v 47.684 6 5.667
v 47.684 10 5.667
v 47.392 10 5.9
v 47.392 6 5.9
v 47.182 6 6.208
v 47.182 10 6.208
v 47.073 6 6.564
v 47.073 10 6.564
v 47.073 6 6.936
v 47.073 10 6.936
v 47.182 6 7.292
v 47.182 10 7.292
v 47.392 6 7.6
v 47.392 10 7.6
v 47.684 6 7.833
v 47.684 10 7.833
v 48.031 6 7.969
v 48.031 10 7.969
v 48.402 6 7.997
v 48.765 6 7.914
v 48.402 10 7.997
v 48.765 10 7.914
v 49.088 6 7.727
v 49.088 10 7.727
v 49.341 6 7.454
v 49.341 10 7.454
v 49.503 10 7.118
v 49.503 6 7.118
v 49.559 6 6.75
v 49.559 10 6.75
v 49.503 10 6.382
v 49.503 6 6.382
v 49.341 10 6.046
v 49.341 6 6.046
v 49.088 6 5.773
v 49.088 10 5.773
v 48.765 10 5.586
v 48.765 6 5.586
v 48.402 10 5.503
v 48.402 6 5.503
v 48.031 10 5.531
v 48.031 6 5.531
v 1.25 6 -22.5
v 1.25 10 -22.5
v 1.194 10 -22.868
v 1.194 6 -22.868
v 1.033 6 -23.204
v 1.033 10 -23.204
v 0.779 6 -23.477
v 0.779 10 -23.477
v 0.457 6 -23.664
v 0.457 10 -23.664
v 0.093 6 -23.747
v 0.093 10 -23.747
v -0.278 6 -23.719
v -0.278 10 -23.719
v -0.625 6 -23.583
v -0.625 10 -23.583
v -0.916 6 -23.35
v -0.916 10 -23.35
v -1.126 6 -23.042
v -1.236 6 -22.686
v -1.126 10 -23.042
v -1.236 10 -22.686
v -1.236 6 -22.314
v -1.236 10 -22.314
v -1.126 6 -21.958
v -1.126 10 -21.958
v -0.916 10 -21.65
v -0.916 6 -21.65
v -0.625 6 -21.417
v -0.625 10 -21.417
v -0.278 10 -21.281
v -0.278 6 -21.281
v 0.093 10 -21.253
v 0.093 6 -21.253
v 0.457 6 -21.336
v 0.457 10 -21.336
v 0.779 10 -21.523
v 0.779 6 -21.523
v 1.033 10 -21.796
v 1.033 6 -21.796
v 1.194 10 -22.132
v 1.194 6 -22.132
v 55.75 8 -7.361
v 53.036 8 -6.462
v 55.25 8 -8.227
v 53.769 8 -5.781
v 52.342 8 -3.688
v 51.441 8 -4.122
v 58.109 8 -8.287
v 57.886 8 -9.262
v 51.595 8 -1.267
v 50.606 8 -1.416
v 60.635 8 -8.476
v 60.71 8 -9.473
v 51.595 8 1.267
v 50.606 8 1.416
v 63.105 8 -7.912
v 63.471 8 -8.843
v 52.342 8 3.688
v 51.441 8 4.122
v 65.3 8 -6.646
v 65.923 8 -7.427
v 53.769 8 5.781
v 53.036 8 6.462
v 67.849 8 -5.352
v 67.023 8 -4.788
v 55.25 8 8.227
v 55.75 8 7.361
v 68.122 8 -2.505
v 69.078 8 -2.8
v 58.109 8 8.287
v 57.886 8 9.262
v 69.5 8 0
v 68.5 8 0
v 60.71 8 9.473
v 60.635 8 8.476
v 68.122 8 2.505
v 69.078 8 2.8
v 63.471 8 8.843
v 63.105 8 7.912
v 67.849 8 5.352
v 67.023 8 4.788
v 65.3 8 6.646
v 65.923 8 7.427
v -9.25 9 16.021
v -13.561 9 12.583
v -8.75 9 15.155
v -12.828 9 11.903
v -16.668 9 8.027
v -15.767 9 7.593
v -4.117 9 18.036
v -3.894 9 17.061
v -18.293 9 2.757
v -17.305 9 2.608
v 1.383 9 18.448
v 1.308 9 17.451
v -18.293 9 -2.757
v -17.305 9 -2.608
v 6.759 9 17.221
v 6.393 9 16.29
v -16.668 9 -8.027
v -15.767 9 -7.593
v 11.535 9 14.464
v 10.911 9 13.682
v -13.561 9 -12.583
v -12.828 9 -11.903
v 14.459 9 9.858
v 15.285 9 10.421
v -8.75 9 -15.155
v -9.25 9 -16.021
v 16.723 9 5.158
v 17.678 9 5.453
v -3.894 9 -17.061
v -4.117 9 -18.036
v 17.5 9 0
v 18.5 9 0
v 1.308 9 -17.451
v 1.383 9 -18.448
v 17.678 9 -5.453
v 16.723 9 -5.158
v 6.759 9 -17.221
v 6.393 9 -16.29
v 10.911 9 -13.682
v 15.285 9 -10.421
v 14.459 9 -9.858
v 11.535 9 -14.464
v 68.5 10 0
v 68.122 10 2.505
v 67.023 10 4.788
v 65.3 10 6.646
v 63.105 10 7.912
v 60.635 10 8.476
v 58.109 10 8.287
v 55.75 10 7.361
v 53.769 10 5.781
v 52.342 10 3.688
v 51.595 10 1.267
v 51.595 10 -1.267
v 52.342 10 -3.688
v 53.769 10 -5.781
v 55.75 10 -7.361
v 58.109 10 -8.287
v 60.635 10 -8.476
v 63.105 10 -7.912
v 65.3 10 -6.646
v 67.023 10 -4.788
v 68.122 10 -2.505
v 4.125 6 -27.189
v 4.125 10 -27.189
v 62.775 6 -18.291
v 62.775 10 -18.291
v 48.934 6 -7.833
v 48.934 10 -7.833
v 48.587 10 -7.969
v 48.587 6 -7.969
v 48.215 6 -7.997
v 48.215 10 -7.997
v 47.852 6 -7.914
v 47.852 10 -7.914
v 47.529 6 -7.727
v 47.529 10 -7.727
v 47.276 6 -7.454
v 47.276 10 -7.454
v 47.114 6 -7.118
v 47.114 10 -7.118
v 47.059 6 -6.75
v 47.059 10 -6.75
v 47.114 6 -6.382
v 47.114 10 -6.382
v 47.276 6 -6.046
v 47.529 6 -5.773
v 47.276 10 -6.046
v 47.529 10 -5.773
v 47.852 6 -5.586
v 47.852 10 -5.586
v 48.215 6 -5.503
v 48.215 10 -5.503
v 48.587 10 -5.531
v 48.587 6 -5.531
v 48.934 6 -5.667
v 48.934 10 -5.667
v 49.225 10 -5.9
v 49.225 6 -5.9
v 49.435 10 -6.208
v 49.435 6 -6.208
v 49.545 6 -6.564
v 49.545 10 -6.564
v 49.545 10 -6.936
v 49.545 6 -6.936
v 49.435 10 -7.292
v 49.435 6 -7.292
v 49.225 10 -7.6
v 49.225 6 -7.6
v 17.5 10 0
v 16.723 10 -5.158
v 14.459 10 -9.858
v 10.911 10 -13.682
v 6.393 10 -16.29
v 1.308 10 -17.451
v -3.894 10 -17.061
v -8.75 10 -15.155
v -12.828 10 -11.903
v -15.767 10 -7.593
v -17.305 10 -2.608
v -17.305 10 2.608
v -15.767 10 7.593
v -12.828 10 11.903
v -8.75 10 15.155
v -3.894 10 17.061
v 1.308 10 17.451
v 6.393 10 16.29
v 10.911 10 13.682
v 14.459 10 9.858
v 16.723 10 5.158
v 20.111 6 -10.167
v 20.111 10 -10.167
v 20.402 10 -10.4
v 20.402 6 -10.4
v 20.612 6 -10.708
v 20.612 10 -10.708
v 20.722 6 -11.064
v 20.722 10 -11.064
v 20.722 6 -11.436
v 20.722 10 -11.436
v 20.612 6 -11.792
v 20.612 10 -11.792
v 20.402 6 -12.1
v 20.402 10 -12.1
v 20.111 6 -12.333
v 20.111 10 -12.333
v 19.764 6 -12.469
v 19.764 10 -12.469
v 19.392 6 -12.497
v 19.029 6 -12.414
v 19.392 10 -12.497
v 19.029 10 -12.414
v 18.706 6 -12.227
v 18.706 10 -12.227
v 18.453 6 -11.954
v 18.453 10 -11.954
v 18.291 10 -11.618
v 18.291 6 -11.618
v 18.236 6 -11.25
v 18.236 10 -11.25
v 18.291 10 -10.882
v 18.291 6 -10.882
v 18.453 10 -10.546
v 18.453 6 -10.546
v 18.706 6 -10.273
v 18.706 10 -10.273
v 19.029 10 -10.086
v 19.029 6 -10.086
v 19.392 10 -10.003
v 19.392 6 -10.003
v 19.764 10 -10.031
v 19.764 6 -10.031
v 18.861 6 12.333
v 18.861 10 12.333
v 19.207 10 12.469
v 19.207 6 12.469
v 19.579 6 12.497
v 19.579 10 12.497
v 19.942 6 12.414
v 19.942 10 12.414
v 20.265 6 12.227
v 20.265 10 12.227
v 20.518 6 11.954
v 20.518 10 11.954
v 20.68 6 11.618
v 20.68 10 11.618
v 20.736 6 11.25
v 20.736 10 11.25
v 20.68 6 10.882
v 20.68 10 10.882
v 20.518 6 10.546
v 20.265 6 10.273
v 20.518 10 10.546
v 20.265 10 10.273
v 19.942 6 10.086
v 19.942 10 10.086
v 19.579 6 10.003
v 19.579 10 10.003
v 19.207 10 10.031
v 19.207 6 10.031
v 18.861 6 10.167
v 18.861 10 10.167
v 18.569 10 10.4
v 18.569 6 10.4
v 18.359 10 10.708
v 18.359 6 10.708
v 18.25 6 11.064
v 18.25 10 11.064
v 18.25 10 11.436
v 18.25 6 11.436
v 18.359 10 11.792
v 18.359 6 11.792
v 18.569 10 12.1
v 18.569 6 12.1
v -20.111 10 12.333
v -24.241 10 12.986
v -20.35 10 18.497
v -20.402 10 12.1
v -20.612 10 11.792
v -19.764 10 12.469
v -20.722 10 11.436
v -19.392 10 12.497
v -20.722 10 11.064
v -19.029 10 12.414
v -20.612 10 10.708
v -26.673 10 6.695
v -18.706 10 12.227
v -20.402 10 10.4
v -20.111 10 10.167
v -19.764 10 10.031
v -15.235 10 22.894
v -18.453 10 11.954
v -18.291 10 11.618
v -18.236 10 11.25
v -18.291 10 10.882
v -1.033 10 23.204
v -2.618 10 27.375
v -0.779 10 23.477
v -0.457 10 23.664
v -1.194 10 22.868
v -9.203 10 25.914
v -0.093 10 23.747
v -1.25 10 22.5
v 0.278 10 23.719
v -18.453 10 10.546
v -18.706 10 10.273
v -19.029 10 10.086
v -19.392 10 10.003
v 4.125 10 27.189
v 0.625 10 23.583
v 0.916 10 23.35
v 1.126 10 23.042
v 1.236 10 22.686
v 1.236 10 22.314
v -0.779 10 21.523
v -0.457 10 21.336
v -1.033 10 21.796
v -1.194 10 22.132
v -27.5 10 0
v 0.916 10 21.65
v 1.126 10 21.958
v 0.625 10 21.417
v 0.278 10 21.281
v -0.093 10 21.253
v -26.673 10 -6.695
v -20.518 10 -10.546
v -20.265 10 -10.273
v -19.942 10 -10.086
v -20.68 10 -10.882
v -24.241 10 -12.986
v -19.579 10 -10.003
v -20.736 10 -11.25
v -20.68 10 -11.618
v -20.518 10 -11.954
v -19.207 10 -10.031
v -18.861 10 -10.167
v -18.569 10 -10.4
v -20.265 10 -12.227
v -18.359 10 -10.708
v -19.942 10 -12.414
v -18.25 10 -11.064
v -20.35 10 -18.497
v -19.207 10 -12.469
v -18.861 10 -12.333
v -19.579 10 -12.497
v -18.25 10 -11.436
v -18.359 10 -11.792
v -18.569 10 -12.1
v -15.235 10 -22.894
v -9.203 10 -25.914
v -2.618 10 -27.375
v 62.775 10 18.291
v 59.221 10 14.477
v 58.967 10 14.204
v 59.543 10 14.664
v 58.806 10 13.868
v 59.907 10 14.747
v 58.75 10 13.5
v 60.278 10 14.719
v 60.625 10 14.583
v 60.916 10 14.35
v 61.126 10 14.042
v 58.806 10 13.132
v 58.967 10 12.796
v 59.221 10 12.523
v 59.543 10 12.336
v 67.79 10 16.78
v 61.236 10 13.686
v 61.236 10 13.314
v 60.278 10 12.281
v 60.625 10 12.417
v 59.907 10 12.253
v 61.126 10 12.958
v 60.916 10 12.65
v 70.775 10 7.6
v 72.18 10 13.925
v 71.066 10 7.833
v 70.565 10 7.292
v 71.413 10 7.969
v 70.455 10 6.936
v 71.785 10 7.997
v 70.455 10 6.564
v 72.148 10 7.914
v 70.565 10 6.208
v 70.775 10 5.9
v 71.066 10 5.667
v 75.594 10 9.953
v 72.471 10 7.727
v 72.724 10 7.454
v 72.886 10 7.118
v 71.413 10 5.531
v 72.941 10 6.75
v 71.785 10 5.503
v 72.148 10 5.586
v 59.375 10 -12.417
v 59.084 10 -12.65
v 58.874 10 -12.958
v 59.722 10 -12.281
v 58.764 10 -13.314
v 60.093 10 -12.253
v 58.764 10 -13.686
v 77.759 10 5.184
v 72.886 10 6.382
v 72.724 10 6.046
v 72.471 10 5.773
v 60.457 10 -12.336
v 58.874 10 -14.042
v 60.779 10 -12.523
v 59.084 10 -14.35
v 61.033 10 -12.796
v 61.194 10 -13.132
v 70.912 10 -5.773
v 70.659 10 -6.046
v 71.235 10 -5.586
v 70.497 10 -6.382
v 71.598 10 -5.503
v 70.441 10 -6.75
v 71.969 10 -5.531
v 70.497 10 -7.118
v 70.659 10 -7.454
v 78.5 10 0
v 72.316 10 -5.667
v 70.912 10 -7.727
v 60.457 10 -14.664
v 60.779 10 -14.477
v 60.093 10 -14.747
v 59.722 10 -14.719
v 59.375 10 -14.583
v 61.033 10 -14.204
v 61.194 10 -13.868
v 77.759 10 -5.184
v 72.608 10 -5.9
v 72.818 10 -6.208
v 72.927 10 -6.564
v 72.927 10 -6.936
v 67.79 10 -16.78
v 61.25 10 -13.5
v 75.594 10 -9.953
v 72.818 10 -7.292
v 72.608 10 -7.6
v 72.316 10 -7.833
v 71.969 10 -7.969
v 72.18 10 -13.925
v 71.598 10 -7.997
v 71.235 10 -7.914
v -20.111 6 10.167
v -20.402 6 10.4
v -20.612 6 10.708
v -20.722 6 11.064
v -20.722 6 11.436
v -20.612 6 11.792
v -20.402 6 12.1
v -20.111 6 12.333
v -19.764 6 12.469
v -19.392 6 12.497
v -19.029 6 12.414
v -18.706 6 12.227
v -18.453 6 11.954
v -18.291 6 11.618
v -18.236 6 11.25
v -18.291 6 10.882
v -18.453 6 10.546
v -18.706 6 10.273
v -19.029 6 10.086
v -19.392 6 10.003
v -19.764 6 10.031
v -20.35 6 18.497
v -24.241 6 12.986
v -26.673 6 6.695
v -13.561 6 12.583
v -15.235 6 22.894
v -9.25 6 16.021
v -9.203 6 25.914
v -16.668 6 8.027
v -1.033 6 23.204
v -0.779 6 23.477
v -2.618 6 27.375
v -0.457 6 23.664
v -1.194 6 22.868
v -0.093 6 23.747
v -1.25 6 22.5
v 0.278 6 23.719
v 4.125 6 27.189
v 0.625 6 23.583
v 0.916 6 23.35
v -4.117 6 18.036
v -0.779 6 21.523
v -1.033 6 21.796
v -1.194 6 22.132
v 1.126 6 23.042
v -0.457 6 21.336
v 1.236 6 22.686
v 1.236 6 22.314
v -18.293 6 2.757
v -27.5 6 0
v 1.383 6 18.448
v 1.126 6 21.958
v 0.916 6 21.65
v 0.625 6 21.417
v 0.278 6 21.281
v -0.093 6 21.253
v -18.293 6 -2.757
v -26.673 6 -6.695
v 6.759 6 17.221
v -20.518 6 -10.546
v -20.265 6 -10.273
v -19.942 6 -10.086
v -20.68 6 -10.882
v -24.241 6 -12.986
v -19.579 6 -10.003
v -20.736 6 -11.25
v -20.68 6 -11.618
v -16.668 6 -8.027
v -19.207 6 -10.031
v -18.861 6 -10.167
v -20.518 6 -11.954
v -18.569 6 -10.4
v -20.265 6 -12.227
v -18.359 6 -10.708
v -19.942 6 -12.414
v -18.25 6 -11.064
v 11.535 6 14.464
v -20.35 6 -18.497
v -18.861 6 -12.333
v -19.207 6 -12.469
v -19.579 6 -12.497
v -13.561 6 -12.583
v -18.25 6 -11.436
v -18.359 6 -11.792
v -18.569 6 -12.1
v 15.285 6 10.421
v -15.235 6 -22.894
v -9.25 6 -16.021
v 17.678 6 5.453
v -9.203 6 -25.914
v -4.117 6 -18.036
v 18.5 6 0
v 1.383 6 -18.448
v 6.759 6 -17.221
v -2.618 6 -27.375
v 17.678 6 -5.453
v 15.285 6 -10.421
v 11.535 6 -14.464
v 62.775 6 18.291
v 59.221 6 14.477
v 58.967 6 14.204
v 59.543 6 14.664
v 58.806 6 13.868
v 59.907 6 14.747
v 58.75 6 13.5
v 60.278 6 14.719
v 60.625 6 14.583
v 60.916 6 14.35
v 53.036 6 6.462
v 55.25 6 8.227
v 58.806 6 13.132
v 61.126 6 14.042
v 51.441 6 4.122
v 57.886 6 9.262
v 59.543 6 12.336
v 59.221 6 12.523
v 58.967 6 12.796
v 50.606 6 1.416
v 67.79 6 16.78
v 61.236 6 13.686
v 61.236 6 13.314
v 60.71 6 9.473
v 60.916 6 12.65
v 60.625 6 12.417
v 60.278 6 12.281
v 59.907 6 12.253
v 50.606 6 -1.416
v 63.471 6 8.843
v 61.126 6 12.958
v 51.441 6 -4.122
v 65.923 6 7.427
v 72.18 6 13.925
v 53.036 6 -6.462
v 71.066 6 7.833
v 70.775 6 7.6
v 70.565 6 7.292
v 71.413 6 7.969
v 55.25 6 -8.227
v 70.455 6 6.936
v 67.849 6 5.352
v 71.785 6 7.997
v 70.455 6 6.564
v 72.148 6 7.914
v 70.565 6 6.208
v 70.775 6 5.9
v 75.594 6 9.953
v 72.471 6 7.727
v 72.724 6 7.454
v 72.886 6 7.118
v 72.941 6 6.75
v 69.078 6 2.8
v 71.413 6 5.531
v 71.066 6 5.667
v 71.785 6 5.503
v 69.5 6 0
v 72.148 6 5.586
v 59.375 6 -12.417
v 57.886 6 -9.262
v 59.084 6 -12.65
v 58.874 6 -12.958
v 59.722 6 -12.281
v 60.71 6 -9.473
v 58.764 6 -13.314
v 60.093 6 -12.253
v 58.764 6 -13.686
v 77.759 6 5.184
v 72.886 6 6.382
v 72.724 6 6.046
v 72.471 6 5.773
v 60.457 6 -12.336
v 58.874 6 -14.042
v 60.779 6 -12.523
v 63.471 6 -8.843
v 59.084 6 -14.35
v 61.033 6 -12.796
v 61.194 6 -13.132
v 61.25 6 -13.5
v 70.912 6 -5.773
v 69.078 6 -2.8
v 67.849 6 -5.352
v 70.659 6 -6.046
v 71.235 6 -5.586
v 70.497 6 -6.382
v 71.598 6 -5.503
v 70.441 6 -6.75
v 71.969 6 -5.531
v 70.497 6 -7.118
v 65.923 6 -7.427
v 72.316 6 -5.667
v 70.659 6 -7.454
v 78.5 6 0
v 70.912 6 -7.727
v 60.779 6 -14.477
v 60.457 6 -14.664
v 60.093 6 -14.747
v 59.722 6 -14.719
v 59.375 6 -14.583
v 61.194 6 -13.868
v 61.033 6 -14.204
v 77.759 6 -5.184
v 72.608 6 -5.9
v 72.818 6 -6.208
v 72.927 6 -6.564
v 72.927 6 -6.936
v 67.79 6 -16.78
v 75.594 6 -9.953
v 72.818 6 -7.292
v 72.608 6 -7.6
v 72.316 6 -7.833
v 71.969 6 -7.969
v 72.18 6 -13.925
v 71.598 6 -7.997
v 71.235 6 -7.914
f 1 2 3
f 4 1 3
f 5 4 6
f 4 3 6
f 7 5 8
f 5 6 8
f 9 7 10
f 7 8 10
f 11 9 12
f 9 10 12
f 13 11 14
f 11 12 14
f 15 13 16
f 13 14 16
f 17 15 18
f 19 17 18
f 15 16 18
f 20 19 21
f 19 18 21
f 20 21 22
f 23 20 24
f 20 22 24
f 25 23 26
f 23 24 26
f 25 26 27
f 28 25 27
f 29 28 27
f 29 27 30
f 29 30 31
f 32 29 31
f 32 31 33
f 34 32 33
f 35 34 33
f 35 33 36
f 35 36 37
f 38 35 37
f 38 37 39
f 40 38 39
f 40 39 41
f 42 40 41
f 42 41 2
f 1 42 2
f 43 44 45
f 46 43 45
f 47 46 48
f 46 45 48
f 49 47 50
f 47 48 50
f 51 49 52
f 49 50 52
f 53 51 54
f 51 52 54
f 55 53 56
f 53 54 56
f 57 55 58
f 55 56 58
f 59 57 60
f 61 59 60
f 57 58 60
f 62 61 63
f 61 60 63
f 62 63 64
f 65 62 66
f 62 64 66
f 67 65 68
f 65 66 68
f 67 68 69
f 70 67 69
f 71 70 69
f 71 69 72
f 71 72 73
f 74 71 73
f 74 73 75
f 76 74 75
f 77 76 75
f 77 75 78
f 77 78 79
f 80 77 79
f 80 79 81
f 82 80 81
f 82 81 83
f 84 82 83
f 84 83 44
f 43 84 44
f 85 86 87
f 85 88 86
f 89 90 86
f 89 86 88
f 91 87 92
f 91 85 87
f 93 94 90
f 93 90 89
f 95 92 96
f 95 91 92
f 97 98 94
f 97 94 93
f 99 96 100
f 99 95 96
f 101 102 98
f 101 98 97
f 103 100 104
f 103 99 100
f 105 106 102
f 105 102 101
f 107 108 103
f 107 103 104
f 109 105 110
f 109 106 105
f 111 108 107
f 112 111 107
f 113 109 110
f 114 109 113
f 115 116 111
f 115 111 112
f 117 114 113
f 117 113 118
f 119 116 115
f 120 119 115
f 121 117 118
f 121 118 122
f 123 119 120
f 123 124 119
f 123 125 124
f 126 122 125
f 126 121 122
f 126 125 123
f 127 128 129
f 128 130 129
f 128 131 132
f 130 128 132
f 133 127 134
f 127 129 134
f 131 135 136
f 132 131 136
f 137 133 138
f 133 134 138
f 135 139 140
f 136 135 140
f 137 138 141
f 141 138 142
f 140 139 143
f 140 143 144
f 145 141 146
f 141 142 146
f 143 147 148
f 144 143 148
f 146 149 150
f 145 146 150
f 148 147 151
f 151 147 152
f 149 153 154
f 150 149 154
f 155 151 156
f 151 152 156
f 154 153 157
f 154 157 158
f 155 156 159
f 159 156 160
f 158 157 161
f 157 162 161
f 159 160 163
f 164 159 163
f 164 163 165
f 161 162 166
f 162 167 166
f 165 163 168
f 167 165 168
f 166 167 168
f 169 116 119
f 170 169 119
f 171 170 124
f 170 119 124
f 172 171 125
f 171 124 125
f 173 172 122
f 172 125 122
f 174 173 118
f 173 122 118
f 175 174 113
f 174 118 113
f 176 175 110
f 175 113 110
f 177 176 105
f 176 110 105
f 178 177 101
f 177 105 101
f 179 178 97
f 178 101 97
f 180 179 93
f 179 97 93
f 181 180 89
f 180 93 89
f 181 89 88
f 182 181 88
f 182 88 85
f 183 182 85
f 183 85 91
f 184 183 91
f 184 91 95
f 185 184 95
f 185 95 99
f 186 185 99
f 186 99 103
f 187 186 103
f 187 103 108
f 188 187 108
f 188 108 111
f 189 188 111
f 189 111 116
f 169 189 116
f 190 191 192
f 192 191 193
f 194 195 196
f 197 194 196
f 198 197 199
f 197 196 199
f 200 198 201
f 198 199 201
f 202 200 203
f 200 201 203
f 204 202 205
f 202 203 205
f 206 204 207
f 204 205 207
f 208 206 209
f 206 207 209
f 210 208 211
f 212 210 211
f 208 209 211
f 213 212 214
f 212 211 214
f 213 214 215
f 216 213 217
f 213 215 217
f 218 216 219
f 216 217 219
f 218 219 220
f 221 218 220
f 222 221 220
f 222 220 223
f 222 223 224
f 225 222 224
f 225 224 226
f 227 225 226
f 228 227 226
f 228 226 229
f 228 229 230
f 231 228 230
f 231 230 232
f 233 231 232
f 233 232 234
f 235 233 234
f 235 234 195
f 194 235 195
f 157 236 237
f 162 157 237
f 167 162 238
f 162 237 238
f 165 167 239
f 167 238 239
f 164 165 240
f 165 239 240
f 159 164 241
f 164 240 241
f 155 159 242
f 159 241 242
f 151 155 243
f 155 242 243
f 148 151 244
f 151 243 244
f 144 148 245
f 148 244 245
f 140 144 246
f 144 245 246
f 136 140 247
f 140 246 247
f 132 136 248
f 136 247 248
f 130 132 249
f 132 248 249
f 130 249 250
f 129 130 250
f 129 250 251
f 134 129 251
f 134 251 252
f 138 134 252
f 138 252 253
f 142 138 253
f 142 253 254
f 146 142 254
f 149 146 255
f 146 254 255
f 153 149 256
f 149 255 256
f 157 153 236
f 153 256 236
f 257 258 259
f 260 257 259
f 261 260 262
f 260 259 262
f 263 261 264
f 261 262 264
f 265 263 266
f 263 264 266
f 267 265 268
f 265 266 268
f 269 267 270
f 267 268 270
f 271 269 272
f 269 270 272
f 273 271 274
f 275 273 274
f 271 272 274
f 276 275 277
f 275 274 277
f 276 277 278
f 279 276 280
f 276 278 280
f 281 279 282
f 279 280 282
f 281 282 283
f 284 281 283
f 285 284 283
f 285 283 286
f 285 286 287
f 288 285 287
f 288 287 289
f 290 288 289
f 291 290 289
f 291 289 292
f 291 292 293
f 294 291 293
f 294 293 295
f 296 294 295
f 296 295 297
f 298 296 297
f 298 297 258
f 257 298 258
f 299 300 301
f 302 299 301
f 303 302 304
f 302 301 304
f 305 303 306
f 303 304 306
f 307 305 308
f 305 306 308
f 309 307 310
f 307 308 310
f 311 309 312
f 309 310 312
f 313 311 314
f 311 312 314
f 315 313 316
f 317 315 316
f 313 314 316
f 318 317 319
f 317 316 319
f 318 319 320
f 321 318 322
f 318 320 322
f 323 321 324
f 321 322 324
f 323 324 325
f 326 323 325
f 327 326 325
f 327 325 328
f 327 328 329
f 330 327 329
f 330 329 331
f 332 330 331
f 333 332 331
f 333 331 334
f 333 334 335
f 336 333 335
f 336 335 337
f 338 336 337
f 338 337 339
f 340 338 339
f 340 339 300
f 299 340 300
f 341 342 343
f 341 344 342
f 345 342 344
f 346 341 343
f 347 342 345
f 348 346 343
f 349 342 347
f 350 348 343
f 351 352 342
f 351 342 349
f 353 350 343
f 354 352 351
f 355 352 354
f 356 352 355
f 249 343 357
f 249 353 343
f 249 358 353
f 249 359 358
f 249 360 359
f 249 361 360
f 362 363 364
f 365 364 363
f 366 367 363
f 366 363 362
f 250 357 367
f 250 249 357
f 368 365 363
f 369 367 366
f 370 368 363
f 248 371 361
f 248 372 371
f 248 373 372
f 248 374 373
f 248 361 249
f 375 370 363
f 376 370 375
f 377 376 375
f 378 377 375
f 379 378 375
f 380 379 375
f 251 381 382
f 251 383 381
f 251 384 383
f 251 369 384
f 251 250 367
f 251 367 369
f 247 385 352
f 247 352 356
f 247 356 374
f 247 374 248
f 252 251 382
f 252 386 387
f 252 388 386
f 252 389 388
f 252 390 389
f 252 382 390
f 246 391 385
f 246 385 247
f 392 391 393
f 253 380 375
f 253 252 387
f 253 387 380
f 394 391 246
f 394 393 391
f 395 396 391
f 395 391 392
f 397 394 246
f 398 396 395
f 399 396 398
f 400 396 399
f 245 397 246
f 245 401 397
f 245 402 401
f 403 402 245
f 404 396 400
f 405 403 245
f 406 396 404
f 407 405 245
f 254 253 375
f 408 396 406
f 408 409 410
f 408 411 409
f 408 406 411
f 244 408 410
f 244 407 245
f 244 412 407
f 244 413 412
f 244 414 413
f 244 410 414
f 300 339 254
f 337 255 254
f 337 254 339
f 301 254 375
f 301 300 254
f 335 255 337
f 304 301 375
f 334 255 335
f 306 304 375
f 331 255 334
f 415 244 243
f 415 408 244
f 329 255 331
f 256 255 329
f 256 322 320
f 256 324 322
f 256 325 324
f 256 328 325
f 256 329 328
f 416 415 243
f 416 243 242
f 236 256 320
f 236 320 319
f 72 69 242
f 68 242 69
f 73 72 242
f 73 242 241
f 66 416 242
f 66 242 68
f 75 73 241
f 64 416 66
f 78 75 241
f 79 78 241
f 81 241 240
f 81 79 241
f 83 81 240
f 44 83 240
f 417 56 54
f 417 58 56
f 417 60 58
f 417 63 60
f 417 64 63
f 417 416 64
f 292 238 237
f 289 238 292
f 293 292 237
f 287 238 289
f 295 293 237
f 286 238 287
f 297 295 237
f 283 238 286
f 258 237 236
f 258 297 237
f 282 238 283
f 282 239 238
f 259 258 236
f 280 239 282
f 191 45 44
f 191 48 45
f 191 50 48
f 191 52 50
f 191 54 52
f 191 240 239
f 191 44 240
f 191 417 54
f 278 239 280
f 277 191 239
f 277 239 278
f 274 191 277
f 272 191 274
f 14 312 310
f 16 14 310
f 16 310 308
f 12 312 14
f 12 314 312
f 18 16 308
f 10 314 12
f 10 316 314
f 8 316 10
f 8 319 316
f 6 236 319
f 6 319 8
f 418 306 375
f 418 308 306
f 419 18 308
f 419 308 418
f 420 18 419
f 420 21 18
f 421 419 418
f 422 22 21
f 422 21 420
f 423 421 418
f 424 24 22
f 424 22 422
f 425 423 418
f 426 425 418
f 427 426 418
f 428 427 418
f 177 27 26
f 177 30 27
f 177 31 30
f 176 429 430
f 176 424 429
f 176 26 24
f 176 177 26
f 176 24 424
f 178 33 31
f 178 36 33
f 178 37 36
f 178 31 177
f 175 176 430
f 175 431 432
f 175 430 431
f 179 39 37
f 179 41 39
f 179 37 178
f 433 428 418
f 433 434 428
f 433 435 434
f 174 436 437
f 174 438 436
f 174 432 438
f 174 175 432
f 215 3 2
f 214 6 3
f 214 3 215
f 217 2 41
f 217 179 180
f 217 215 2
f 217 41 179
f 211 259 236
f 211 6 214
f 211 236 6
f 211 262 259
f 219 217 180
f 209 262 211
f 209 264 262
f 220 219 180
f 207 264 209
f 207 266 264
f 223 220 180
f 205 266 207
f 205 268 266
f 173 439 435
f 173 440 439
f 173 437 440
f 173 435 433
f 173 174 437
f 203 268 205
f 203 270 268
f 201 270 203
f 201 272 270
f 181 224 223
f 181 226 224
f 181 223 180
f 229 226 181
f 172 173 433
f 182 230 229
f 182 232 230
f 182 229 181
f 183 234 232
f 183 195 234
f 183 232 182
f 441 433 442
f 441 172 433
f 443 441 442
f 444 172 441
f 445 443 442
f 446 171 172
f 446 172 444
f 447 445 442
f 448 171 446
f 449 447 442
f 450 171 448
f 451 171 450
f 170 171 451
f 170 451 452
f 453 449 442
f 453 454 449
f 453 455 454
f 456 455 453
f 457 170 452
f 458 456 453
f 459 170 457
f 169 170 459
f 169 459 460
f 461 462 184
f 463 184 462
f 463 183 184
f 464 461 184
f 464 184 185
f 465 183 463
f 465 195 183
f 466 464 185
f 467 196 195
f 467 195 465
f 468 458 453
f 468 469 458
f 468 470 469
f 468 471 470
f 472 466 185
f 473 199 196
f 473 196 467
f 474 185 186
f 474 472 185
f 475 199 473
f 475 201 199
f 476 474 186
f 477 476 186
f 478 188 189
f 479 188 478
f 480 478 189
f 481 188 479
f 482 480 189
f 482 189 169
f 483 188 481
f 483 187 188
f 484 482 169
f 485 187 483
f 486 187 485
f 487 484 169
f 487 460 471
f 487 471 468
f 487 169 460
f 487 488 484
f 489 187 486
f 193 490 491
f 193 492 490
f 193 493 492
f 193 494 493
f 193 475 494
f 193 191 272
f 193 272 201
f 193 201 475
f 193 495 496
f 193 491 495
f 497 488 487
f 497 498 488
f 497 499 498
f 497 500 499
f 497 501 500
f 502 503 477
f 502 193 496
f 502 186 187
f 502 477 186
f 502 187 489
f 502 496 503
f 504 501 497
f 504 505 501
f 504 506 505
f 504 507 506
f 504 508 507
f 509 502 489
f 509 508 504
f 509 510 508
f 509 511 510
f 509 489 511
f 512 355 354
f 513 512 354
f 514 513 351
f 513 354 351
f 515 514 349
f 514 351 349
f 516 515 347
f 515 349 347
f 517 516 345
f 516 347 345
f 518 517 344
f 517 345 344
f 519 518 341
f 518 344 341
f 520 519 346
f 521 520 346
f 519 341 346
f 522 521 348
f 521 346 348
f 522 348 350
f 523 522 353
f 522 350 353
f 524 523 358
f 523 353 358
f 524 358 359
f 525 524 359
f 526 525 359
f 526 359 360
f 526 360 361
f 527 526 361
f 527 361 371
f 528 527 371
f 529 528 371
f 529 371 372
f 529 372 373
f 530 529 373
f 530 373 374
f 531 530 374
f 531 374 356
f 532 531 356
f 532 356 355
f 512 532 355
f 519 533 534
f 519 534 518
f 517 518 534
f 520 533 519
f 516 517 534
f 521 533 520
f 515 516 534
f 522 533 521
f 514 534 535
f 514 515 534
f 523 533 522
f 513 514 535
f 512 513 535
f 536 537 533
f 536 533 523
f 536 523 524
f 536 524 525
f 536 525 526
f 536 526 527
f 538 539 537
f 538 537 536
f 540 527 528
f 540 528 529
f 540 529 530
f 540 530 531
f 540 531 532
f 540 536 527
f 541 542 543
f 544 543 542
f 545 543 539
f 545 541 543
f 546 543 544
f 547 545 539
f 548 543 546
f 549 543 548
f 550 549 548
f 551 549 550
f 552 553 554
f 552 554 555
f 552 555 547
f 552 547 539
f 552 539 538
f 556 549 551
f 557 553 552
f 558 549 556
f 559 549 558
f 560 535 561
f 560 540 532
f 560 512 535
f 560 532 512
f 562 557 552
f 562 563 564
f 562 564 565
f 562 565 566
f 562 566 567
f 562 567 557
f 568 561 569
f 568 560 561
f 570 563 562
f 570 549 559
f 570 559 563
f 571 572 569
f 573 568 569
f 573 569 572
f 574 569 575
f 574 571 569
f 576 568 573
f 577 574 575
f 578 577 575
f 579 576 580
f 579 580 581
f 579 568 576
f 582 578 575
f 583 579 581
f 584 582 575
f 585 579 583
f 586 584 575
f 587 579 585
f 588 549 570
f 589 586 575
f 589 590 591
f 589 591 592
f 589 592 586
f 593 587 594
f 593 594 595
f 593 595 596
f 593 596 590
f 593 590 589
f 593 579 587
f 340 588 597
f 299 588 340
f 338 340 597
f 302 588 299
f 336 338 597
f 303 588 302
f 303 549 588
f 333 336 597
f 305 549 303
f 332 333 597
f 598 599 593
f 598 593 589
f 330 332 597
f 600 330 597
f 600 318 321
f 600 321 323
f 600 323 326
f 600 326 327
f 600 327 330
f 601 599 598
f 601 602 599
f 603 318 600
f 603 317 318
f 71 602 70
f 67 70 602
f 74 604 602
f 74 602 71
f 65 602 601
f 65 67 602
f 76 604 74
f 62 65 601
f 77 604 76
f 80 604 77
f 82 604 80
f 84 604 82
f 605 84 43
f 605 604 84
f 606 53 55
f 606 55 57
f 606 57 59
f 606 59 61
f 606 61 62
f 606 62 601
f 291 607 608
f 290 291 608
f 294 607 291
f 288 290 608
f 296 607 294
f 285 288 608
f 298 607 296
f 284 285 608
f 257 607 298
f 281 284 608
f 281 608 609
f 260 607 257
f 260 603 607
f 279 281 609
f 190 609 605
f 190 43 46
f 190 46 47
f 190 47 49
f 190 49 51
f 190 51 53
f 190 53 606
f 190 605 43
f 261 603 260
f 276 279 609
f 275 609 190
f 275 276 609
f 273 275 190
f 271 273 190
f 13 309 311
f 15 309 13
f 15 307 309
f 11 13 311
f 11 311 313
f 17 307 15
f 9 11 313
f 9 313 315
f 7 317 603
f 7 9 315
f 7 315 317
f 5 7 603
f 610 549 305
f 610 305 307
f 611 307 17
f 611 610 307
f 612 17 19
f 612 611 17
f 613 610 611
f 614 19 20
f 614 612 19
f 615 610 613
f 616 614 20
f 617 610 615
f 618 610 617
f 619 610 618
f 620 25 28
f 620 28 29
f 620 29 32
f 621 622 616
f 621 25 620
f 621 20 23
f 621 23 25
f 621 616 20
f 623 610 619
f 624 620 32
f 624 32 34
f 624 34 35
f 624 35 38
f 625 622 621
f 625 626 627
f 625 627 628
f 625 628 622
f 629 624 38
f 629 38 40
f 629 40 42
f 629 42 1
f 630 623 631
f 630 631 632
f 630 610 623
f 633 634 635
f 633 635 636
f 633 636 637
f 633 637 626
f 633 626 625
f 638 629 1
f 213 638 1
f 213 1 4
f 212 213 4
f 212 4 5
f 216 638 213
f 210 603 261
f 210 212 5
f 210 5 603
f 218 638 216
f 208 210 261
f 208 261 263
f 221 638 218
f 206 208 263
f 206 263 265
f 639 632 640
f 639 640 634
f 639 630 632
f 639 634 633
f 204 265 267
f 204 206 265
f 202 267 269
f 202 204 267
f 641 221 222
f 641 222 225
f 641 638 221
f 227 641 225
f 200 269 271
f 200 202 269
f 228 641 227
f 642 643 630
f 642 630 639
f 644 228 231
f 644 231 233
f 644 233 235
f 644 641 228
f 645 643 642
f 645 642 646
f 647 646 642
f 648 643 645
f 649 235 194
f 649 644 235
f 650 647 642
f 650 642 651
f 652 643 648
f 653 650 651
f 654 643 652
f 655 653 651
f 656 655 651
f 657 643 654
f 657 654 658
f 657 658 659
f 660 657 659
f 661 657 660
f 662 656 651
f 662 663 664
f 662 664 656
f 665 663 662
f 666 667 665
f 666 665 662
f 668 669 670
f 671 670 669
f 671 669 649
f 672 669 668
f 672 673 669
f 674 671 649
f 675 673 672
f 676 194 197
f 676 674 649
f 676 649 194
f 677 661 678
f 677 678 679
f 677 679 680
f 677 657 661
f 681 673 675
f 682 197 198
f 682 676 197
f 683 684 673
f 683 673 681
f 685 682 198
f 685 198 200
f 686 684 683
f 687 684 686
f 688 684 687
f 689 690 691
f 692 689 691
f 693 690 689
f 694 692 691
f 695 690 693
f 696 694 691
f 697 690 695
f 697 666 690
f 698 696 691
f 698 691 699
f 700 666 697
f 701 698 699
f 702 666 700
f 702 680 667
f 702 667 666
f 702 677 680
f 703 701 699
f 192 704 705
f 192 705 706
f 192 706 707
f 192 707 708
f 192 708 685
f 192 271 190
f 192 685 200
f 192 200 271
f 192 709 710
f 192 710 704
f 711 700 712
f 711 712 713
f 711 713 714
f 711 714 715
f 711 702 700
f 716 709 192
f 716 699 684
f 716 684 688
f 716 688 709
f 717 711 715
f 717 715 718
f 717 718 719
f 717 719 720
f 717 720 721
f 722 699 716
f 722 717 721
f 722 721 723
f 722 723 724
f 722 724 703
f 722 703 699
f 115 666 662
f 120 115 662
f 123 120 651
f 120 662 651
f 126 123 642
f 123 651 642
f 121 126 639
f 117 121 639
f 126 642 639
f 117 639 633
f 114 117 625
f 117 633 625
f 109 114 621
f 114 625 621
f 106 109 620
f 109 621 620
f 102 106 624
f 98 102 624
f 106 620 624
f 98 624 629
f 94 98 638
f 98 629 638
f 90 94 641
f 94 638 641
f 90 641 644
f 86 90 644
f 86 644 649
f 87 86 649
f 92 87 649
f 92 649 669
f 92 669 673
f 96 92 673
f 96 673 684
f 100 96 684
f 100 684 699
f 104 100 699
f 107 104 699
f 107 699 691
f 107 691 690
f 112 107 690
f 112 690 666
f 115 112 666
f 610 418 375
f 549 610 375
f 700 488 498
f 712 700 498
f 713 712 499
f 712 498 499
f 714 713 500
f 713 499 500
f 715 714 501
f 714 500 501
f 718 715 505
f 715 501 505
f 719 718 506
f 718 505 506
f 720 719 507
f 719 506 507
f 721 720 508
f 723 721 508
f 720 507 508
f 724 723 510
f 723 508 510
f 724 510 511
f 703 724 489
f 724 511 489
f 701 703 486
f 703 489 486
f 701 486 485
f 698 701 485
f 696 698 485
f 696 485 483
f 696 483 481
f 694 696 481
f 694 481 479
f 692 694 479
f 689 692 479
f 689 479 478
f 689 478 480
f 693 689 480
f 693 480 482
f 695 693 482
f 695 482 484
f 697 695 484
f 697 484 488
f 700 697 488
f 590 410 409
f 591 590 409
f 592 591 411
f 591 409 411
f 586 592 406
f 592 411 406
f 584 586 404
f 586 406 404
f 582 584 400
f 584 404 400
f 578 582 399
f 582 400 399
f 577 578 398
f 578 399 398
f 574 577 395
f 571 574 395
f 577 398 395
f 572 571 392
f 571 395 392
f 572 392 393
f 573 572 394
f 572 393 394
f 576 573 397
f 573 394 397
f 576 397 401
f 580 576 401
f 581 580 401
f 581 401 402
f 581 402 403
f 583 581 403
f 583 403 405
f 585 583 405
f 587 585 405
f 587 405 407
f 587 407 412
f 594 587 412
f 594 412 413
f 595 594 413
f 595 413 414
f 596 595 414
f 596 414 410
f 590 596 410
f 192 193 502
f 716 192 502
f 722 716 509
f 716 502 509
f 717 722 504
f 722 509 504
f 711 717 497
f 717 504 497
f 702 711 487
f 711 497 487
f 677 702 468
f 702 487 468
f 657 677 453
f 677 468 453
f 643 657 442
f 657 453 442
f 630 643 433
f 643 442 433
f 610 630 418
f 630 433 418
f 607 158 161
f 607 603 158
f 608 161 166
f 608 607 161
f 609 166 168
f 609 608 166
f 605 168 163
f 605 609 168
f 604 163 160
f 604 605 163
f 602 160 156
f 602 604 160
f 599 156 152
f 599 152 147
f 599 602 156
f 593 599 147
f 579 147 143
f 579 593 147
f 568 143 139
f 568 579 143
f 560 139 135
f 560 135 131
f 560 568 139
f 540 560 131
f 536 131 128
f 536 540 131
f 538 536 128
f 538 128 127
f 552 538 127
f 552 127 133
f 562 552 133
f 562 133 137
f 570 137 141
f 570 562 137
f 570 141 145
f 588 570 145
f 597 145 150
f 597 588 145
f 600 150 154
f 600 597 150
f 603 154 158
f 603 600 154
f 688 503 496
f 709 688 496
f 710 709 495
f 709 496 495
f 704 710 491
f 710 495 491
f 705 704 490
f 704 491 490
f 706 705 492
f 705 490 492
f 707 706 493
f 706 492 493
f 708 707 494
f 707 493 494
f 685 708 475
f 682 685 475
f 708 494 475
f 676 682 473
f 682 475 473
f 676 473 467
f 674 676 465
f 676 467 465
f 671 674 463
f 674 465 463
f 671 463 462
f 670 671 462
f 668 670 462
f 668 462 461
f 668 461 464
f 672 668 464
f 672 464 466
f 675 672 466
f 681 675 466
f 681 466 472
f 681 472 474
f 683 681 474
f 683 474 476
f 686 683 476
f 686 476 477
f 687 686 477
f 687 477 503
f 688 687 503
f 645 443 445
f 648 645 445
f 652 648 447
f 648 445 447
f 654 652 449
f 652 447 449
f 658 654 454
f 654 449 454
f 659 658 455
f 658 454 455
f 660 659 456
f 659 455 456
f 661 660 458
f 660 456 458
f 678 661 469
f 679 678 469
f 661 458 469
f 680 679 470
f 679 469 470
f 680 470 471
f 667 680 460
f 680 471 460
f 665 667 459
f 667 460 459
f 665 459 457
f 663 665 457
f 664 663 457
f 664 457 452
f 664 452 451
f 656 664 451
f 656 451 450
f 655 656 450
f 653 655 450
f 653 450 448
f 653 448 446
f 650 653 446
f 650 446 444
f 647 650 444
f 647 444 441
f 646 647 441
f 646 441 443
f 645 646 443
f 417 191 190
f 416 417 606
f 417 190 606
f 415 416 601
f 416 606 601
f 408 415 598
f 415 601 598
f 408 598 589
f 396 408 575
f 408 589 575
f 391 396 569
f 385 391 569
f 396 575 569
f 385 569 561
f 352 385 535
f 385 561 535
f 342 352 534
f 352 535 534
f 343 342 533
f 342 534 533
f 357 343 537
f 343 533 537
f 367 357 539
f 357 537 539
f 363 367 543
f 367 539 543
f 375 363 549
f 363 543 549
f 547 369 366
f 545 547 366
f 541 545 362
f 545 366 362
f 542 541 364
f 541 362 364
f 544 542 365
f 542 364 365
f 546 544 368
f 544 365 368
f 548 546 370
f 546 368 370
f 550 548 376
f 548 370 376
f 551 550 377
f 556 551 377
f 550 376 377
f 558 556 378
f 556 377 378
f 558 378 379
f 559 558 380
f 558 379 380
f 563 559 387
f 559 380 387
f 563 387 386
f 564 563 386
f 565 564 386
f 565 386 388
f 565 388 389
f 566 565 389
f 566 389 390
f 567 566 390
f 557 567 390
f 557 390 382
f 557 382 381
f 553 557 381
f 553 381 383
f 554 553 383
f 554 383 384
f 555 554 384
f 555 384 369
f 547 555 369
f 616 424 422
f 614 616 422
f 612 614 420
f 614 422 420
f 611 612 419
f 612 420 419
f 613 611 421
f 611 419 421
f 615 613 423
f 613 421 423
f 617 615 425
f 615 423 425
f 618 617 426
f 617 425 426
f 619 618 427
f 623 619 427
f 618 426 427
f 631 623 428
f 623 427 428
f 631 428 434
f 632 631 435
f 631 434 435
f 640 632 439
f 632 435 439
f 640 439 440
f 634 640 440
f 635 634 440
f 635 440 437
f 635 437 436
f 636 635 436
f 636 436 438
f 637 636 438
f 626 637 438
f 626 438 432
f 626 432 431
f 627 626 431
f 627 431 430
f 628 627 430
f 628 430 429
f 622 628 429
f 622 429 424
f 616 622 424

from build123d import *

# Parameters (mm, degrees)
SKETCH_1_R               = 27.5
SKETCH_1_R_2             = 17.5
EXTRUDE_1_DEPTH          = 5
SKETCH_2_R               = 27.5
SKETCH_2_R_2             = 18.5
EXTRUDE_2_DEPTH          = 5
EXTRUDE_3_DEPTH          = 9
SKETCH_7_R               = 18.5
CUT_EXTRUDE_4_DEPTH      = 4
SKETCH_13_R              = 9.5
CUT_EXTRUDE_9_DEPTH      = 7
SKETCH_14_R              = 8.5
CUT_EXTRUDE_10_DEPTH     = 3
SKETCH_26_W              = 65.286774434
SKETCH_26_H              = 14.284249769
CUT_EXTRUDE_11_DEPTH     = 1111
SKETCH_28_R              = 18.5
SKETCH_28_R_2            = 17.5
EXTRUDE_4_DEPTH          = 1
HOLE_WIZARD_M3_1_D       = 2.5
PATTERN_CIRCULAR_1_COUNT = 6
HOLE_WIZARD_M3_2_D       = 2.5
PATTERN_CIRCULAR_2_COUNT = 6


with BuildPart() as part:
    # 스케치1 → 보스-돌출1 (new body)
    with BuildSketch(Plane(origin=(0, 0, 0), x_dir=(1, 0, 0), z_dir=(0, 1, 0))):
        Circle(SKETCH_1_R)
        Circle(SKETCH_1_R_2, mode=Mode.SUBTRACT)
    extrude(amount=EXTRUDE_1_DEPTH)

    # 스케치2 → 보스-돌출2 (add)
    with BuildSketch(Plane(origin=(0, 5, 0), x_dir=(1, 0, 0), z_dir=(0, 1, 0))):
        Circle(SKETCH_2_R)
        Circle(SKETCH_2_R_2, mode=Mode.SUBTRACT)
    extrude(amount=EXTRUDE_2_DEPTH)

    # 스케치3 → 보스-돌출3 (add)
    with BuildSketch(Plane(origin=(0, 10, 0), x_dir=(1, 0, 0), z_dir=(0, 1, 0))):
        with BuildLine():
            Line((4.125, 27.188864908), (62.775, 18.290690938))
            ThreePointArc((62.775, 18.290690938), (78.5, 0), (62.775, -18.290690938))
            Line((62.775, -18.290690938), (4.125, -27.188864908))
            ThreePointArc((4.125, -27.188864908), (27.5, 0), (4.125, 27.188864908))
        make_face()
    extrude(amount=-EXTRUDE_3_DEPTH)

    # 스케치7 → 컷-돌출4 (cut)
    with BuildSketch(Plane(origin=(0, 5, 0), x_dir=(1, 0, 0), z_dir=(0, 1, 0))):
        Circle(SKETCH_7_R)
    extrude(amount=-CUT_EXTRUDE_4_DEPTH, mode=Mode.SUBTRACT)

    # 스케치13 → 컷-돌출9 (cut)
    with BuildSketch(Plane.XZ.offset(-1)):
        with Locations((60, 0)):
            Circle(SKETCH_13_R)
    extrude(amount=-CUT_EXTRUDE_9_DEPTH, mode=Mode.SUBTRACT)

    # 스케치14 → 컷-돌출10 (cut, through all)
    with BuildSketch(Plane.XZ.offset(-8)):
        with Locations((60, 0)):
            Circle(SKETCH_14_R)
    extrude(amount=-CUT_EXTRUDE_10_DEPTH, mode=Mode.SUBTRACT)

    # 스케치26 → 컷-돌출11 (cut, symmetric)
    with BuildSketch(Plane(origin=(0, 0, 0), x_dir=(0, 0, -1), z_dir=(1, 0, 0))):
        with Locations((-1.179133759, -1.142124885)):
            Rectangle(SKETCH_26_W, SKETCH_26_H)
    extrude(amount=CUT_EXTRUDE_11_DEPTH, both=True, mode=Mode.SUBTRACT)

    # 스케치28 → 보스-돌출4 (add)
    with BuildSketch(Plane(origin=(0, 10, 0), x_dir=(1, 0, 0), z_dir=(0, 1, 0))):
        Circle(SKETCH_28_R)
        Circle(SKETCH_28_R_2, mode=Mode.SUBTRACT)
    extrude(amount=-EXTRUDE_4_DEPTH)

    # M3 탭을 위한 탭 드릴1 (through all)
    with Locations(Plane(origin=(0, 6, 0), x_dir=(-1, 0, 0), z_dir=(0, -1, 0))):
        with Locations((0, 22.5)):
            hole_wizard_m3_1 = Hole(HOLE_WIZARD_M3_1_D / 2)

    # 원형 패턴1: M3 탭을 위한 탭 드릴1 ×6 about axis
    pattern_circular_1_axis = Axis((0, 0, 0), (0, 1, 0))
    for i in range(1, PATTERN_CIRCULAR_1_COUNT):
        add(hole_wizard_m3_1.rotate(pattern_circular_1_axis, i * 360 / PATTERN_CIRCULAR_1_COUNT), mode=Mode.SUBTRACT)

    # M3 탭을 위한 탭 드릴2 (through all)
    with Locations(Plane(origin=(0, 6, 0), x_dir=(-1, 0, 0), z_dir=(0, -1, 0))):
        with Locations((-60, 13.5)):
            hole_wizard_m3_2 = Hole(HOLE_WIZARD_M3_2_D / 2)

    # 원형 패턴2: M3 탭을 위한 탭 드릴2 ×6 about axis
    pattern_circular_2_axis = Axis((60, 0, 0), (0, 1, 0))
    for i in range(1, PATTERN_CIRCULAR_2_COUNT):
        add(hole_wizard_m3_2.rotate(pattern_circular_2_axis, i * 360 / PATTERN_CIRCULAR_2_COUNT), mode=Mode.SUBTRACT)


solid = part.part
